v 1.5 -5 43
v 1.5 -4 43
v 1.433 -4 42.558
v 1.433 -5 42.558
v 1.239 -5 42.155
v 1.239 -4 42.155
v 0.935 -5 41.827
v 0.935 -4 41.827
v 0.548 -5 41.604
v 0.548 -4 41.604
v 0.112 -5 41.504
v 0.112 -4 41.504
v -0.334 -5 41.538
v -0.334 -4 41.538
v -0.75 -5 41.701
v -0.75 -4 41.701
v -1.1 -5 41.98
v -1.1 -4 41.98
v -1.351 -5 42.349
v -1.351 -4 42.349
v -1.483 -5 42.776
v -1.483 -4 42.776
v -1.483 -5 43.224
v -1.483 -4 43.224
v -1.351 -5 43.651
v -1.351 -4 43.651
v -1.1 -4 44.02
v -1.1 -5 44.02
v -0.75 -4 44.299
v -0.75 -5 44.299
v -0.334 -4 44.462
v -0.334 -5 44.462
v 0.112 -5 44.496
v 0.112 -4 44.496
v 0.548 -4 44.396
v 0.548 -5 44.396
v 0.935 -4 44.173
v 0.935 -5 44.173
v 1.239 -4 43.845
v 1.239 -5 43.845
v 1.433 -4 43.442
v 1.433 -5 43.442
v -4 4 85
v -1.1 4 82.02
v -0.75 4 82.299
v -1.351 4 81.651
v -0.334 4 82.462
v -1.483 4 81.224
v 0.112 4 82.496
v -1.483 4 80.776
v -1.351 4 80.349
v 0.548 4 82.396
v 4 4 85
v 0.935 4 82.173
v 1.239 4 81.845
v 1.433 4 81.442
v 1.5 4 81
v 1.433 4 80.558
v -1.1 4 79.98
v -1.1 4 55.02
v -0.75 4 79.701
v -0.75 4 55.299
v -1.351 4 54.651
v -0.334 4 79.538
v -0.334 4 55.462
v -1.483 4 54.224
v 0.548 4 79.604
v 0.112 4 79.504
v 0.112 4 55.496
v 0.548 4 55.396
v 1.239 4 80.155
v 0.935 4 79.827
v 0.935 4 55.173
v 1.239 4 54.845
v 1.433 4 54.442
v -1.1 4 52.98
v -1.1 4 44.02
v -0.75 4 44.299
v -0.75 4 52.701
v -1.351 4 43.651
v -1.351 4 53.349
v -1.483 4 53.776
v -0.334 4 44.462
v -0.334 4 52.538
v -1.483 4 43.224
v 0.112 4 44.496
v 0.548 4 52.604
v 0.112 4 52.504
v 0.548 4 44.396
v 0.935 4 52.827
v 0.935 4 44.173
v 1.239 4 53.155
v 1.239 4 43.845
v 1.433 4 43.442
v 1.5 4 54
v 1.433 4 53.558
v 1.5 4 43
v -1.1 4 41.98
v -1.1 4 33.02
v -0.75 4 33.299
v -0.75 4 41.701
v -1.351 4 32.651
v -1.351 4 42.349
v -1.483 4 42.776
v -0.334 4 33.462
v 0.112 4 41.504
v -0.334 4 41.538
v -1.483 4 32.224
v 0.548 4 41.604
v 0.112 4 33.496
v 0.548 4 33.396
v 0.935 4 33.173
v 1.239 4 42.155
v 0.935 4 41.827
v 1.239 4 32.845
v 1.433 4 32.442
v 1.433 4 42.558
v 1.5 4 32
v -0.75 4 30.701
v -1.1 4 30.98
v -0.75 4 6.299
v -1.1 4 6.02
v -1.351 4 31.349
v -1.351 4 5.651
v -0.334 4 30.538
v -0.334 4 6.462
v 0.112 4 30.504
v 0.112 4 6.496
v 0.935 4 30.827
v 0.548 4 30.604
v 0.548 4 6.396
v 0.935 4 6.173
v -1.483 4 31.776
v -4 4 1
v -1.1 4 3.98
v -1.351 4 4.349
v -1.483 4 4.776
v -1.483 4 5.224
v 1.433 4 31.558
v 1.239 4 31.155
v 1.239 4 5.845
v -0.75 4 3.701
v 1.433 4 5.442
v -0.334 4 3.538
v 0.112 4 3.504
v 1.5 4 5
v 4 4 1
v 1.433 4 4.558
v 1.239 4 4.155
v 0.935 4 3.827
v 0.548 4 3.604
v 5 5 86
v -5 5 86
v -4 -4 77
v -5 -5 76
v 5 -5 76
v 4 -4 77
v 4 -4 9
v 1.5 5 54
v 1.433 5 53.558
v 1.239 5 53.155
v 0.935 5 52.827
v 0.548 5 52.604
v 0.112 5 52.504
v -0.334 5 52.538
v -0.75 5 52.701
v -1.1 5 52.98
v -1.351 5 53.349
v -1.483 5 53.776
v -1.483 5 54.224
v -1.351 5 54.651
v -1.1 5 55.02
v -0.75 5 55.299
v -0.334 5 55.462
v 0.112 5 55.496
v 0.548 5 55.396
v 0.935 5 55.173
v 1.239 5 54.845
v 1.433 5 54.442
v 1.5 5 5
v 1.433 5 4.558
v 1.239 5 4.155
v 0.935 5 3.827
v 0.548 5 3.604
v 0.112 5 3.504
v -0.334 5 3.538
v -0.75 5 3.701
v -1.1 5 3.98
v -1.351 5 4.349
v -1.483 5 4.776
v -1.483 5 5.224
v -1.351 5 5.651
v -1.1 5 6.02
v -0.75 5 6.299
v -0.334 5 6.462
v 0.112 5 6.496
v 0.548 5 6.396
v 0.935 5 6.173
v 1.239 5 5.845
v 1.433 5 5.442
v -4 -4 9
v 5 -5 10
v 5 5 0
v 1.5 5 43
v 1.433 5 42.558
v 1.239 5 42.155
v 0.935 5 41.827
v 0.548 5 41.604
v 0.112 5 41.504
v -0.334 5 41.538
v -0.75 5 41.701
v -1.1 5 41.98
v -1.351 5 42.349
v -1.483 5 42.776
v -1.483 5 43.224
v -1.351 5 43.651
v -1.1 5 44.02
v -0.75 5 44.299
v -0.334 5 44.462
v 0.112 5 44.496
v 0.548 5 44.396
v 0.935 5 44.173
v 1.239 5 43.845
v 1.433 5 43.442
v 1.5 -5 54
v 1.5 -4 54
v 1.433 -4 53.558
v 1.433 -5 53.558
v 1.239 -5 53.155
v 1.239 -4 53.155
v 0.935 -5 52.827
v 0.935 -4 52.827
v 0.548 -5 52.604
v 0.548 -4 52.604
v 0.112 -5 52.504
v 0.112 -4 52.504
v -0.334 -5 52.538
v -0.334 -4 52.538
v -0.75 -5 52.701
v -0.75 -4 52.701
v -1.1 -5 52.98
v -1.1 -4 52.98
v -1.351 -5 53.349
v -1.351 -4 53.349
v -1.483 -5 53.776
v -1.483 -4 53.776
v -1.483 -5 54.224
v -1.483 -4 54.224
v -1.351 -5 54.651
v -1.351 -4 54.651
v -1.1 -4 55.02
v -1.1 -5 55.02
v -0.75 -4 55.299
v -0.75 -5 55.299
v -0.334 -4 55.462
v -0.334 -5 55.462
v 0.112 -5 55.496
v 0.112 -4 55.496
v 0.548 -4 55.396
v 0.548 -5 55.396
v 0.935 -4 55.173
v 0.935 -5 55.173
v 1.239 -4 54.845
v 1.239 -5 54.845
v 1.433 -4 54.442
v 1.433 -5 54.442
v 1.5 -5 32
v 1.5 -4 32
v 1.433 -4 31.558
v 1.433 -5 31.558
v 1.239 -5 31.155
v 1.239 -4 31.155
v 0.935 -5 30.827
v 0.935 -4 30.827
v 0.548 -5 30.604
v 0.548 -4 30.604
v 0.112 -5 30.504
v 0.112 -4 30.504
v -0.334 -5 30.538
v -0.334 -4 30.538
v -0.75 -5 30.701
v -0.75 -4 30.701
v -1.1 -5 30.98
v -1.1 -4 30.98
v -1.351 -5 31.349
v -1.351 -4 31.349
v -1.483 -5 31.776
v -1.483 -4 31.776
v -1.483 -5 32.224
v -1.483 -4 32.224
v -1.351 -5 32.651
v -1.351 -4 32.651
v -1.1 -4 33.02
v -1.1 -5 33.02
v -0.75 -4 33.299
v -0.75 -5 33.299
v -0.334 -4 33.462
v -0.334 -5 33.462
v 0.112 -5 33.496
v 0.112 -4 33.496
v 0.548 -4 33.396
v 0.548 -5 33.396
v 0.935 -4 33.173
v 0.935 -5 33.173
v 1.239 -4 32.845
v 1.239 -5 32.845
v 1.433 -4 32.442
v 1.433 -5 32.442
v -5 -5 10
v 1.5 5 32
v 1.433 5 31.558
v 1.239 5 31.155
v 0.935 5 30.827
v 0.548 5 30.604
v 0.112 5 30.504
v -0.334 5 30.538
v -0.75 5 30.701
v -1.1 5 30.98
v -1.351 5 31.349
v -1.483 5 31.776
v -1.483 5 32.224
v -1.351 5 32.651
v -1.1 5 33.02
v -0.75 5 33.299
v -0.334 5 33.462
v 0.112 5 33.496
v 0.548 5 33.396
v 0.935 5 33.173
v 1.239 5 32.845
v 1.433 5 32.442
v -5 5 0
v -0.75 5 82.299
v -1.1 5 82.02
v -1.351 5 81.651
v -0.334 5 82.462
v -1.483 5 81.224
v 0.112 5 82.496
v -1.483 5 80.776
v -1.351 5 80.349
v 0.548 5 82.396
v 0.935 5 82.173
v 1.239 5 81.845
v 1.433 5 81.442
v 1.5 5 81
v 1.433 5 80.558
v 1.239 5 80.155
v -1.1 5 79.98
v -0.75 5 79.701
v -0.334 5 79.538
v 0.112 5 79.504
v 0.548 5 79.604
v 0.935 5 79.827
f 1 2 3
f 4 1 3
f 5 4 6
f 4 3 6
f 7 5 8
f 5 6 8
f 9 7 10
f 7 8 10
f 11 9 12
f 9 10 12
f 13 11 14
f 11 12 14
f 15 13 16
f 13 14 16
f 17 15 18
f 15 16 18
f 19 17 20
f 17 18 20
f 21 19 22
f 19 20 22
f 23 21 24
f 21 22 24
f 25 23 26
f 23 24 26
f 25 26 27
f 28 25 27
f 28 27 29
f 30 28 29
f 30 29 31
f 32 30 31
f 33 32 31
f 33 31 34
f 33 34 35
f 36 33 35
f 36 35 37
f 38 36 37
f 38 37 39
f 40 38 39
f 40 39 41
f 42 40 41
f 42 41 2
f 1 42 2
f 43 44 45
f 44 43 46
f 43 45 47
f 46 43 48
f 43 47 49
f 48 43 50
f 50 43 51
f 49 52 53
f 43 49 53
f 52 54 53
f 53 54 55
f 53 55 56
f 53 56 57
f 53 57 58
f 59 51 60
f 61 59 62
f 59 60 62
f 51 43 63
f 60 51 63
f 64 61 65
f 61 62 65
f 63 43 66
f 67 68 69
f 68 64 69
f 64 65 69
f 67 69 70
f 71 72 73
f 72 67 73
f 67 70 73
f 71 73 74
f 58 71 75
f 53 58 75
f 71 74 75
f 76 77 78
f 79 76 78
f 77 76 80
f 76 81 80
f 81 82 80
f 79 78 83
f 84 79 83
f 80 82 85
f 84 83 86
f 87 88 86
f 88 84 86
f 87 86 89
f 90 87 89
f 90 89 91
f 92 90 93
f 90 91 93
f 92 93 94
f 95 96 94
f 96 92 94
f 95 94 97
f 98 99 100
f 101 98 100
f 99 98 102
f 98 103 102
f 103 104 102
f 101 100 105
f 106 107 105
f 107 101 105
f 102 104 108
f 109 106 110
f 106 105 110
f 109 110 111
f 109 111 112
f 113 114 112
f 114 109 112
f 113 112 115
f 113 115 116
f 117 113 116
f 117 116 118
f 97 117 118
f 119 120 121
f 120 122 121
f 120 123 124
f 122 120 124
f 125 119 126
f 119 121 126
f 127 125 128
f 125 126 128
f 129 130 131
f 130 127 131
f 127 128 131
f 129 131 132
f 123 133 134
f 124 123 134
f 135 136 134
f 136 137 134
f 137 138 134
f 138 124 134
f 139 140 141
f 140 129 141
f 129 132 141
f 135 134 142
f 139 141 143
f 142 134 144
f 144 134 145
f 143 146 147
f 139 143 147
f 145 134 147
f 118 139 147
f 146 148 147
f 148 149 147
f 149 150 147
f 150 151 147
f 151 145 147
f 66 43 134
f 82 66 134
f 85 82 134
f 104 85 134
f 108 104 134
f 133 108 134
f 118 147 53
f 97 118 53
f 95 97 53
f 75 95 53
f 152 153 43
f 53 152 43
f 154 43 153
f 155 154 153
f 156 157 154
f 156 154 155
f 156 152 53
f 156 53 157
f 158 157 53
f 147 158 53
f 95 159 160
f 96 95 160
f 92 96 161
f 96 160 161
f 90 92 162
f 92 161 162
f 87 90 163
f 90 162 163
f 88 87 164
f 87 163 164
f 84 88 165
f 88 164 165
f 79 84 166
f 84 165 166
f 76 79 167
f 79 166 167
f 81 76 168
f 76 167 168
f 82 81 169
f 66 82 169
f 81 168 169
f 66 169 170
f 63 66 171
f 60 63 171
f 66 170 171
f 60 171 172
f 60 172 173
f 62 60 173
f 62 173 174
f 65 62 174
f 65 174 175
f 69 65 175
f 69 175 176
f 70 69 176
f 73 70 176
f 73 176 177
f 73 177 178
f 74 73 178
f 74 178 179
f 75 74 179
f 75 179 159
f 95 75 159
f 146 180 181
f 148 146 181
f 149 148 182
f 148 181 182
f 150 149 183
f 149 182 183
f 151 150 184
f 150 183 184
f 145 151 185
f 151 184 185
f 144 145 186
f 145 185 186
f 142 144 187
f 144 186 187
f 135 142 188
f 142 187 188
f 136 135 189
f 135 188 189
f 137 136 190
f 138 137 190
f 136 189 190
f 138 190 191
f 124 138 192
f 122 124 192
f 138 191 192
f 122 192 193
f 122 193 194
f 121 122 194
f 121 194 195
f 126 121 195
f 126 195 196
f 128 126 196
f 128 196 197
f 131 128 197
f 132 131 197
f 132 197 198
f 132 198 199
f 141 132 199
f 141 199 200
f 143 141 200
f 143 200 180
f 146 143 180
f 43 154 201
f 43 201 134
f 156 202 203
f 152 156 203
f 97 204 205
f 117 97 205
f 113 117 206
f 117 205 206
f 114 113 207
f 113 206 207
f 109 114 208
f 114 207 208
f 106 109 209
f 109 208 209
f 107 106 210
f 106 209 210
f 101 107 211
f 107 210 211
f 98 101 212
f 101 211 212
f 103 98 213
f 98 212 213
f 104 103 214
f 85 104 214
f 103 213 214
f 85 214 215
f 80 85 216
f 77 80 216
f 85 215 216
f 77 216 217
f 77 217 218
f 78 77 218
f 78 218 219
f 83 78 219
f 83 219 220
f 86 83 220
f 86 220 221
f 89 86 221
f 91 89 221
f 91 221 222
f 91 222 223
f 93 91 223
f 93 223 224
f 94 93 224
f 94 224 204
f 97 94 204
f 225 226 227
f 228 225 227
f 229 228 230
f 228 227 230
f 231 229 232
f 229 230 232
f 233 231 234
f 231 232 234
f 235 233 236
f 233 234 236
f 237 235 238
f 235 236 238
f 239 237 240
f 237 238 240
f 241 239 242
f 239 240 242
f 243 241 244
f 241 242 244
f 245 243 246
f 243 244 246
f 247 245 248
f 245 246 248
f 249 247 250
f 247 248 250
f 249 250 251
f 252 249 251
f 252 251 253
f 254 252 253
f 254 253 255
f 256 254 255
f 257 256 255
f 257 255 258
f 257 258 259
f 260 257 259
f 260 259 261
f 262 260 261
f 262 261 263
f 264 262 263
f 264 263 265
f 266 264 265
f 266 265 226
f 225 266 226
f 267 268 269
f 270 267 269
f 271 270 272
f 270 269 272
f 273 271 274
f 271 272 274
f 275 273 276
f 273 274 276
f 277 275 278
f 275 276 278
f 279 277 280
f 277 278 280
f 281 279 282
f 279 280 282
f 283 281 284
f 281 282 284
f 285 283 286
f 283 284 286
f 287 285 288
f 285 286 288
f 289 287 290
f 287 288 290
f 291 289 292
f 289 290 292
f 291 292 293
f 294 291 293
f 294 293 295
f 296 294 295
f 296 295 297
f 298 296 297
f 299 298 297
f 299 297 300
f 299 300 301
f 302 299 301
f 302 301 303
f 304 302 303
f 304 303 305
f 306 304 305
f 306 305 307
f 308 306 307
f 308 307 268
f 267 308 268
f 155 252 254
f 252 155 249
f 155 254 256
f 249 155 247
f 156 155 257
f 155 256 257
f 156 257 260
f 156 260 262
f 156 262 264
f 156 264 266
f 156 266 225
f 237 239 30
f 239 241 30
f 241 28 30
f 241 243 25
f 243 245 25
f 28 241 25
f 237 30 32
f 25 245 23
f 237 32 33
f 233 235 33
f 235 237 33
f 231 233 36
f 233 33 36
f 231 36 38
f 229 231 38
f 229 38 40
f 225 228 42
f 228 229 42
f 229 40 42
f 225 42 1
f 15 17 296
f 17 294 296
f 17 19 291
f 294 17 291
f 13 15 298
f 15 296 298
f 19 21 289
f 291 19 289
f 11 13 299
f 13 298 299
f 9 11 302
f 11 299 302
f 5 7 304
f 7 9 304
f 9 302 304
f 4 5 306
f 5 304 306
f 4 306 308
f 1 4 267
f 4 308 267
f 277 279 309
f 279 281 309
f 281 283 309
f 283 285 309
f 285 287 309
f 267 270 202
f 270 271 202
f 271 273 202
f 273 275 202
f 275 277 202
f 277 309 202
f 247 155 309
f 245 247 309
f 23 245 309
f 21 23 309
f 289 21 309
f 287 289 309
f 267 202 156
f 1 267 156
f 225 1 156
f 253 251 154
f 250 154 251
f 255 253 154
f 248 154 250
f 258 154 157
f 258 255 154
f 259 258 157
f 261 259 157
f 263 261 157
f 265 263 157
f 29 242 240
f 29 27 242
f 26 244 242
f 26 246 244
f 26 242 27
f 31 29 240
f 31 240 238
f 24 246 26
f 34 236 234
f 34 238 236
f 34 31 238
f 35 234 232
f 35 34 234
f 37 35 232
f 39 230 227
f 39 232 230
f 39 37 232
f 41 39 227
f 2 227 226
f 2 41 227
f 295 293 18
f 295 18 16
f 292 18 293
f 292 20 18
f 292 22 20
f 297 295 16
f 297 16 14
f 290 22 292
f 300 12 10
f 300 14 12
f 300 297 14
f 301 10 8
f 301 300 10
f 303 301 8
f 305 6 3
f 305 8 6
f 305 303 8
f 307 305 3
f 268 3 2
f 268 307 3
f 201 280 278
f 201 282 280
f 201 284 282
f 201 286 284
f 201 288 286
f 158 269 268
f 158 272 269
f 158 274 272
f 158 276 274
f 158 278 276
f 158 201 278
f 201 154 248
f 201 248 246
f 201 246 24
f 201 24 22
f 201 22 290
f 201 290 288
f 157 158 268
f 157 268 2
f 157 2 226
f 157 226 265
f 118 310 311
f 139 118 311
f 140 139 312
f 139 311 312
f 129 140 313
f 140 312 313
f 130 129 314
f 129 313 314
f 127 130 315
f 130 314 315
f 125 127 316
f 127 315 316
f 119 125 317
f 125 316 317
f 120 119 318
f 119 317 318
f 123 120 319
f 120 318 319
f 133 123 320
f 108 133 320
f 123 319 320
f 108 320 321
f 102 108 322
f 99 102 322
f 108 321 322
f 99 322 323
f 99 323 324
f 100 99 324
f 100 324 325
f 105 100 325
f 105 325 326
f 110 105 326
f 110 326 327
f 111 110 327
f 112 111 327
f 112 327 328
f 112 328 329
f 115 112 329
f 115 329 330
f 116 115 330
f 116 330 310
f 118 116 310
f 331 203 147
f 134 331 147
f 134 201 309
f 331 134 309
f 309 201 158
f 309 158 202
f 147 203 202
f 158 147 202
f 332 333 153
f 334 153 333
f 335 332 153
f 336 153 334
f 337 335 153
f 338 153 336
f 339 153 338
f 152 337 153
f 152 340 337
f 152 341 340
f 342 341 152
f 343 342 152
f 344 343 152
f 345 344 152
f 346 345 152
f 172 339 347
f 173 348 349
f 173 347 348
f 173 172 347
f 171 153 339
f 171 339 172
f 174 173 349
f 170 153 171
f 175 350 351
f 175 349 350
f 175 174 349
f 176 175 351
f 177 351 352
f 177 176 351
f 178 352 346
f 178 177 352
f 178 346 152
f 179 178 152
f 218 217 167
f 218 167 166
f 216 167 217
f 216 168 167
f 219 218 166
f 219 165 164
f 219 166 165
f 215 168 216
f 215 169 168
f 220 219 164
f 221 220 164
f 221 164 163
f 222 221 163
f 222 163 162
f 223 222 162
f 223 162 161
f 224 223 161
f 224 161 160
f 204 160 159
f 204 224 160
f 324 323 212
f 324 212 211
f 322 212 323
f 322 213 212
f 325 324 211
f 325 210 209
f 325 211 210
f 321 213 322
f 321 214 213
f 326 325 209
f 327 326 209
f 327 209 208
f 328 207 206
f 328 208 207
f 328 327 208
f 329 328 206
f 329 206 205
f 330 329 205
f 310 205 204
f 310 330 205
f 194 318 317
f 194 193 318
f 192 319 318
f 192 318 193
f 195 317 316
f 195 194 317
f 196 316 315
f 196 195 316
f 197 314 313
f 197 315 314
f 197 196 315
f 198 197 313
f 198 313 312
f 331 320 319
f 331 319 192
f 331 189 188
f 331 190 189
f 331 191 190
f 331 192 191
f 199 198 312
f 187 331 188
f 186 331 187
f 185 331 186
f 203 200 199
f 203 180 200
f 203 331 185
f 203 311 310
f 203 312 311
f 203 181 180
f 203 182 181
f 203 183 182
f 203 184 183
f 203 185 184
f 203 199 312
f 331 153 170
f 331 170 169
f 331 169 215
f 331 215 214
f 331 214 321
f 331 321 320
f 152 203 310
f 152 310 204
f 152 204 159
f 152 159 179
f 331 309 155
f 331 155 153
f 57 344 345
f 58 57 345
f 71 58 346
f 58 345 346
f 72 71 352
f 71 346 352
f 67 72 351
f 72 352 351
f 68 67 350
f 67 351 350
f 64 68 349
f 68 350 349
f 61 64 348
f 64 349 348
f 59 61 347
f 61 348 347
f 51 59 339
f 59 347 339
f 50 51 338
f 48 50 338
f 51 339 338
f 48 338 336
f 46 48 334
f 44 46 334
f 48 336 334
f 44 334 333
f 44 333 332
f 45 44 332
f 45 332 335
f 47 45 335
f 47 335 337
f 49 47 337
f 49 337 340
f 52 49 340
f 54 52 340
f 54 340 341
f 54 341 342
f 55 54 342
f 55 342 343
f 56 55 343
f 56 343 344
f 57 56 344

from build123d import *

# Parameters (mm, degrees)
SKETCH_1_W          = 10
SKETCH_1_H          = 10
SKETCH_1_W_2        = 8
SKETCH_1_H_2        = 8
EXTRUDE_1_DEPTH     = 86
SKETCH_2_R          = 1.5
CUT_EXTRUDE_1_DEPTH = 11
CUT_EXTRUDE_2_DEPTH = 10


with BuildPart() as part:
    # 草图1 → 拉伸-薄壁1 (new body)
    with BuildSketch(Plane.XY):
        Rectangle(SKETCH_1_W, SKETCH_1_H)
        Rectangle(SKETCH_1_W_2, SKETCH_1_H_2, mode=Mode.SUBTRACT)
    extrude(amount=EXTRUDE_1_DEPTH)

    # 草图2 → 切除-拉伸1 (cut, through all)
    with BuildSketch(Plane(origin=(0, 5, 0), x_dir=(1, 0, 0), z_dir=(0, 1, 0))):
        with Locations((0, -54)):
            Circle(SKETCH_2_R)
        with Locations((0, -32)):
            Circle(SKETCH_2_R)
        with Locations((0, -43)):
            Circle(SKETCH_2_R)
        with Locations((0, -81)):
            Circle(SKETCH_2_R)
        with Locations((0, -5)):
            Circle(SKETCH_2_R)
    extrude(amount=-CUT_EXTRUDE_1_DEPTH, mode=Mode.SUBTRACT)

    # 草图3 → 切除-拉伸2 (cut)
    with BuildSketch(Plane(origin=(5, 0, 0), x_dir=(0, 0, -1), z_dir=(1, 0, 0))):
        Polygon((-86, 5), (-76, -5), (-86, -5), align=None)
        Polygon((0, 5), (-10, -5), (0, -5), align=None)
    extrude(amount=-CUT_EXTRUDE_2_DEPTH, mode=Mode.SUBTRACT)


solid = part.part
